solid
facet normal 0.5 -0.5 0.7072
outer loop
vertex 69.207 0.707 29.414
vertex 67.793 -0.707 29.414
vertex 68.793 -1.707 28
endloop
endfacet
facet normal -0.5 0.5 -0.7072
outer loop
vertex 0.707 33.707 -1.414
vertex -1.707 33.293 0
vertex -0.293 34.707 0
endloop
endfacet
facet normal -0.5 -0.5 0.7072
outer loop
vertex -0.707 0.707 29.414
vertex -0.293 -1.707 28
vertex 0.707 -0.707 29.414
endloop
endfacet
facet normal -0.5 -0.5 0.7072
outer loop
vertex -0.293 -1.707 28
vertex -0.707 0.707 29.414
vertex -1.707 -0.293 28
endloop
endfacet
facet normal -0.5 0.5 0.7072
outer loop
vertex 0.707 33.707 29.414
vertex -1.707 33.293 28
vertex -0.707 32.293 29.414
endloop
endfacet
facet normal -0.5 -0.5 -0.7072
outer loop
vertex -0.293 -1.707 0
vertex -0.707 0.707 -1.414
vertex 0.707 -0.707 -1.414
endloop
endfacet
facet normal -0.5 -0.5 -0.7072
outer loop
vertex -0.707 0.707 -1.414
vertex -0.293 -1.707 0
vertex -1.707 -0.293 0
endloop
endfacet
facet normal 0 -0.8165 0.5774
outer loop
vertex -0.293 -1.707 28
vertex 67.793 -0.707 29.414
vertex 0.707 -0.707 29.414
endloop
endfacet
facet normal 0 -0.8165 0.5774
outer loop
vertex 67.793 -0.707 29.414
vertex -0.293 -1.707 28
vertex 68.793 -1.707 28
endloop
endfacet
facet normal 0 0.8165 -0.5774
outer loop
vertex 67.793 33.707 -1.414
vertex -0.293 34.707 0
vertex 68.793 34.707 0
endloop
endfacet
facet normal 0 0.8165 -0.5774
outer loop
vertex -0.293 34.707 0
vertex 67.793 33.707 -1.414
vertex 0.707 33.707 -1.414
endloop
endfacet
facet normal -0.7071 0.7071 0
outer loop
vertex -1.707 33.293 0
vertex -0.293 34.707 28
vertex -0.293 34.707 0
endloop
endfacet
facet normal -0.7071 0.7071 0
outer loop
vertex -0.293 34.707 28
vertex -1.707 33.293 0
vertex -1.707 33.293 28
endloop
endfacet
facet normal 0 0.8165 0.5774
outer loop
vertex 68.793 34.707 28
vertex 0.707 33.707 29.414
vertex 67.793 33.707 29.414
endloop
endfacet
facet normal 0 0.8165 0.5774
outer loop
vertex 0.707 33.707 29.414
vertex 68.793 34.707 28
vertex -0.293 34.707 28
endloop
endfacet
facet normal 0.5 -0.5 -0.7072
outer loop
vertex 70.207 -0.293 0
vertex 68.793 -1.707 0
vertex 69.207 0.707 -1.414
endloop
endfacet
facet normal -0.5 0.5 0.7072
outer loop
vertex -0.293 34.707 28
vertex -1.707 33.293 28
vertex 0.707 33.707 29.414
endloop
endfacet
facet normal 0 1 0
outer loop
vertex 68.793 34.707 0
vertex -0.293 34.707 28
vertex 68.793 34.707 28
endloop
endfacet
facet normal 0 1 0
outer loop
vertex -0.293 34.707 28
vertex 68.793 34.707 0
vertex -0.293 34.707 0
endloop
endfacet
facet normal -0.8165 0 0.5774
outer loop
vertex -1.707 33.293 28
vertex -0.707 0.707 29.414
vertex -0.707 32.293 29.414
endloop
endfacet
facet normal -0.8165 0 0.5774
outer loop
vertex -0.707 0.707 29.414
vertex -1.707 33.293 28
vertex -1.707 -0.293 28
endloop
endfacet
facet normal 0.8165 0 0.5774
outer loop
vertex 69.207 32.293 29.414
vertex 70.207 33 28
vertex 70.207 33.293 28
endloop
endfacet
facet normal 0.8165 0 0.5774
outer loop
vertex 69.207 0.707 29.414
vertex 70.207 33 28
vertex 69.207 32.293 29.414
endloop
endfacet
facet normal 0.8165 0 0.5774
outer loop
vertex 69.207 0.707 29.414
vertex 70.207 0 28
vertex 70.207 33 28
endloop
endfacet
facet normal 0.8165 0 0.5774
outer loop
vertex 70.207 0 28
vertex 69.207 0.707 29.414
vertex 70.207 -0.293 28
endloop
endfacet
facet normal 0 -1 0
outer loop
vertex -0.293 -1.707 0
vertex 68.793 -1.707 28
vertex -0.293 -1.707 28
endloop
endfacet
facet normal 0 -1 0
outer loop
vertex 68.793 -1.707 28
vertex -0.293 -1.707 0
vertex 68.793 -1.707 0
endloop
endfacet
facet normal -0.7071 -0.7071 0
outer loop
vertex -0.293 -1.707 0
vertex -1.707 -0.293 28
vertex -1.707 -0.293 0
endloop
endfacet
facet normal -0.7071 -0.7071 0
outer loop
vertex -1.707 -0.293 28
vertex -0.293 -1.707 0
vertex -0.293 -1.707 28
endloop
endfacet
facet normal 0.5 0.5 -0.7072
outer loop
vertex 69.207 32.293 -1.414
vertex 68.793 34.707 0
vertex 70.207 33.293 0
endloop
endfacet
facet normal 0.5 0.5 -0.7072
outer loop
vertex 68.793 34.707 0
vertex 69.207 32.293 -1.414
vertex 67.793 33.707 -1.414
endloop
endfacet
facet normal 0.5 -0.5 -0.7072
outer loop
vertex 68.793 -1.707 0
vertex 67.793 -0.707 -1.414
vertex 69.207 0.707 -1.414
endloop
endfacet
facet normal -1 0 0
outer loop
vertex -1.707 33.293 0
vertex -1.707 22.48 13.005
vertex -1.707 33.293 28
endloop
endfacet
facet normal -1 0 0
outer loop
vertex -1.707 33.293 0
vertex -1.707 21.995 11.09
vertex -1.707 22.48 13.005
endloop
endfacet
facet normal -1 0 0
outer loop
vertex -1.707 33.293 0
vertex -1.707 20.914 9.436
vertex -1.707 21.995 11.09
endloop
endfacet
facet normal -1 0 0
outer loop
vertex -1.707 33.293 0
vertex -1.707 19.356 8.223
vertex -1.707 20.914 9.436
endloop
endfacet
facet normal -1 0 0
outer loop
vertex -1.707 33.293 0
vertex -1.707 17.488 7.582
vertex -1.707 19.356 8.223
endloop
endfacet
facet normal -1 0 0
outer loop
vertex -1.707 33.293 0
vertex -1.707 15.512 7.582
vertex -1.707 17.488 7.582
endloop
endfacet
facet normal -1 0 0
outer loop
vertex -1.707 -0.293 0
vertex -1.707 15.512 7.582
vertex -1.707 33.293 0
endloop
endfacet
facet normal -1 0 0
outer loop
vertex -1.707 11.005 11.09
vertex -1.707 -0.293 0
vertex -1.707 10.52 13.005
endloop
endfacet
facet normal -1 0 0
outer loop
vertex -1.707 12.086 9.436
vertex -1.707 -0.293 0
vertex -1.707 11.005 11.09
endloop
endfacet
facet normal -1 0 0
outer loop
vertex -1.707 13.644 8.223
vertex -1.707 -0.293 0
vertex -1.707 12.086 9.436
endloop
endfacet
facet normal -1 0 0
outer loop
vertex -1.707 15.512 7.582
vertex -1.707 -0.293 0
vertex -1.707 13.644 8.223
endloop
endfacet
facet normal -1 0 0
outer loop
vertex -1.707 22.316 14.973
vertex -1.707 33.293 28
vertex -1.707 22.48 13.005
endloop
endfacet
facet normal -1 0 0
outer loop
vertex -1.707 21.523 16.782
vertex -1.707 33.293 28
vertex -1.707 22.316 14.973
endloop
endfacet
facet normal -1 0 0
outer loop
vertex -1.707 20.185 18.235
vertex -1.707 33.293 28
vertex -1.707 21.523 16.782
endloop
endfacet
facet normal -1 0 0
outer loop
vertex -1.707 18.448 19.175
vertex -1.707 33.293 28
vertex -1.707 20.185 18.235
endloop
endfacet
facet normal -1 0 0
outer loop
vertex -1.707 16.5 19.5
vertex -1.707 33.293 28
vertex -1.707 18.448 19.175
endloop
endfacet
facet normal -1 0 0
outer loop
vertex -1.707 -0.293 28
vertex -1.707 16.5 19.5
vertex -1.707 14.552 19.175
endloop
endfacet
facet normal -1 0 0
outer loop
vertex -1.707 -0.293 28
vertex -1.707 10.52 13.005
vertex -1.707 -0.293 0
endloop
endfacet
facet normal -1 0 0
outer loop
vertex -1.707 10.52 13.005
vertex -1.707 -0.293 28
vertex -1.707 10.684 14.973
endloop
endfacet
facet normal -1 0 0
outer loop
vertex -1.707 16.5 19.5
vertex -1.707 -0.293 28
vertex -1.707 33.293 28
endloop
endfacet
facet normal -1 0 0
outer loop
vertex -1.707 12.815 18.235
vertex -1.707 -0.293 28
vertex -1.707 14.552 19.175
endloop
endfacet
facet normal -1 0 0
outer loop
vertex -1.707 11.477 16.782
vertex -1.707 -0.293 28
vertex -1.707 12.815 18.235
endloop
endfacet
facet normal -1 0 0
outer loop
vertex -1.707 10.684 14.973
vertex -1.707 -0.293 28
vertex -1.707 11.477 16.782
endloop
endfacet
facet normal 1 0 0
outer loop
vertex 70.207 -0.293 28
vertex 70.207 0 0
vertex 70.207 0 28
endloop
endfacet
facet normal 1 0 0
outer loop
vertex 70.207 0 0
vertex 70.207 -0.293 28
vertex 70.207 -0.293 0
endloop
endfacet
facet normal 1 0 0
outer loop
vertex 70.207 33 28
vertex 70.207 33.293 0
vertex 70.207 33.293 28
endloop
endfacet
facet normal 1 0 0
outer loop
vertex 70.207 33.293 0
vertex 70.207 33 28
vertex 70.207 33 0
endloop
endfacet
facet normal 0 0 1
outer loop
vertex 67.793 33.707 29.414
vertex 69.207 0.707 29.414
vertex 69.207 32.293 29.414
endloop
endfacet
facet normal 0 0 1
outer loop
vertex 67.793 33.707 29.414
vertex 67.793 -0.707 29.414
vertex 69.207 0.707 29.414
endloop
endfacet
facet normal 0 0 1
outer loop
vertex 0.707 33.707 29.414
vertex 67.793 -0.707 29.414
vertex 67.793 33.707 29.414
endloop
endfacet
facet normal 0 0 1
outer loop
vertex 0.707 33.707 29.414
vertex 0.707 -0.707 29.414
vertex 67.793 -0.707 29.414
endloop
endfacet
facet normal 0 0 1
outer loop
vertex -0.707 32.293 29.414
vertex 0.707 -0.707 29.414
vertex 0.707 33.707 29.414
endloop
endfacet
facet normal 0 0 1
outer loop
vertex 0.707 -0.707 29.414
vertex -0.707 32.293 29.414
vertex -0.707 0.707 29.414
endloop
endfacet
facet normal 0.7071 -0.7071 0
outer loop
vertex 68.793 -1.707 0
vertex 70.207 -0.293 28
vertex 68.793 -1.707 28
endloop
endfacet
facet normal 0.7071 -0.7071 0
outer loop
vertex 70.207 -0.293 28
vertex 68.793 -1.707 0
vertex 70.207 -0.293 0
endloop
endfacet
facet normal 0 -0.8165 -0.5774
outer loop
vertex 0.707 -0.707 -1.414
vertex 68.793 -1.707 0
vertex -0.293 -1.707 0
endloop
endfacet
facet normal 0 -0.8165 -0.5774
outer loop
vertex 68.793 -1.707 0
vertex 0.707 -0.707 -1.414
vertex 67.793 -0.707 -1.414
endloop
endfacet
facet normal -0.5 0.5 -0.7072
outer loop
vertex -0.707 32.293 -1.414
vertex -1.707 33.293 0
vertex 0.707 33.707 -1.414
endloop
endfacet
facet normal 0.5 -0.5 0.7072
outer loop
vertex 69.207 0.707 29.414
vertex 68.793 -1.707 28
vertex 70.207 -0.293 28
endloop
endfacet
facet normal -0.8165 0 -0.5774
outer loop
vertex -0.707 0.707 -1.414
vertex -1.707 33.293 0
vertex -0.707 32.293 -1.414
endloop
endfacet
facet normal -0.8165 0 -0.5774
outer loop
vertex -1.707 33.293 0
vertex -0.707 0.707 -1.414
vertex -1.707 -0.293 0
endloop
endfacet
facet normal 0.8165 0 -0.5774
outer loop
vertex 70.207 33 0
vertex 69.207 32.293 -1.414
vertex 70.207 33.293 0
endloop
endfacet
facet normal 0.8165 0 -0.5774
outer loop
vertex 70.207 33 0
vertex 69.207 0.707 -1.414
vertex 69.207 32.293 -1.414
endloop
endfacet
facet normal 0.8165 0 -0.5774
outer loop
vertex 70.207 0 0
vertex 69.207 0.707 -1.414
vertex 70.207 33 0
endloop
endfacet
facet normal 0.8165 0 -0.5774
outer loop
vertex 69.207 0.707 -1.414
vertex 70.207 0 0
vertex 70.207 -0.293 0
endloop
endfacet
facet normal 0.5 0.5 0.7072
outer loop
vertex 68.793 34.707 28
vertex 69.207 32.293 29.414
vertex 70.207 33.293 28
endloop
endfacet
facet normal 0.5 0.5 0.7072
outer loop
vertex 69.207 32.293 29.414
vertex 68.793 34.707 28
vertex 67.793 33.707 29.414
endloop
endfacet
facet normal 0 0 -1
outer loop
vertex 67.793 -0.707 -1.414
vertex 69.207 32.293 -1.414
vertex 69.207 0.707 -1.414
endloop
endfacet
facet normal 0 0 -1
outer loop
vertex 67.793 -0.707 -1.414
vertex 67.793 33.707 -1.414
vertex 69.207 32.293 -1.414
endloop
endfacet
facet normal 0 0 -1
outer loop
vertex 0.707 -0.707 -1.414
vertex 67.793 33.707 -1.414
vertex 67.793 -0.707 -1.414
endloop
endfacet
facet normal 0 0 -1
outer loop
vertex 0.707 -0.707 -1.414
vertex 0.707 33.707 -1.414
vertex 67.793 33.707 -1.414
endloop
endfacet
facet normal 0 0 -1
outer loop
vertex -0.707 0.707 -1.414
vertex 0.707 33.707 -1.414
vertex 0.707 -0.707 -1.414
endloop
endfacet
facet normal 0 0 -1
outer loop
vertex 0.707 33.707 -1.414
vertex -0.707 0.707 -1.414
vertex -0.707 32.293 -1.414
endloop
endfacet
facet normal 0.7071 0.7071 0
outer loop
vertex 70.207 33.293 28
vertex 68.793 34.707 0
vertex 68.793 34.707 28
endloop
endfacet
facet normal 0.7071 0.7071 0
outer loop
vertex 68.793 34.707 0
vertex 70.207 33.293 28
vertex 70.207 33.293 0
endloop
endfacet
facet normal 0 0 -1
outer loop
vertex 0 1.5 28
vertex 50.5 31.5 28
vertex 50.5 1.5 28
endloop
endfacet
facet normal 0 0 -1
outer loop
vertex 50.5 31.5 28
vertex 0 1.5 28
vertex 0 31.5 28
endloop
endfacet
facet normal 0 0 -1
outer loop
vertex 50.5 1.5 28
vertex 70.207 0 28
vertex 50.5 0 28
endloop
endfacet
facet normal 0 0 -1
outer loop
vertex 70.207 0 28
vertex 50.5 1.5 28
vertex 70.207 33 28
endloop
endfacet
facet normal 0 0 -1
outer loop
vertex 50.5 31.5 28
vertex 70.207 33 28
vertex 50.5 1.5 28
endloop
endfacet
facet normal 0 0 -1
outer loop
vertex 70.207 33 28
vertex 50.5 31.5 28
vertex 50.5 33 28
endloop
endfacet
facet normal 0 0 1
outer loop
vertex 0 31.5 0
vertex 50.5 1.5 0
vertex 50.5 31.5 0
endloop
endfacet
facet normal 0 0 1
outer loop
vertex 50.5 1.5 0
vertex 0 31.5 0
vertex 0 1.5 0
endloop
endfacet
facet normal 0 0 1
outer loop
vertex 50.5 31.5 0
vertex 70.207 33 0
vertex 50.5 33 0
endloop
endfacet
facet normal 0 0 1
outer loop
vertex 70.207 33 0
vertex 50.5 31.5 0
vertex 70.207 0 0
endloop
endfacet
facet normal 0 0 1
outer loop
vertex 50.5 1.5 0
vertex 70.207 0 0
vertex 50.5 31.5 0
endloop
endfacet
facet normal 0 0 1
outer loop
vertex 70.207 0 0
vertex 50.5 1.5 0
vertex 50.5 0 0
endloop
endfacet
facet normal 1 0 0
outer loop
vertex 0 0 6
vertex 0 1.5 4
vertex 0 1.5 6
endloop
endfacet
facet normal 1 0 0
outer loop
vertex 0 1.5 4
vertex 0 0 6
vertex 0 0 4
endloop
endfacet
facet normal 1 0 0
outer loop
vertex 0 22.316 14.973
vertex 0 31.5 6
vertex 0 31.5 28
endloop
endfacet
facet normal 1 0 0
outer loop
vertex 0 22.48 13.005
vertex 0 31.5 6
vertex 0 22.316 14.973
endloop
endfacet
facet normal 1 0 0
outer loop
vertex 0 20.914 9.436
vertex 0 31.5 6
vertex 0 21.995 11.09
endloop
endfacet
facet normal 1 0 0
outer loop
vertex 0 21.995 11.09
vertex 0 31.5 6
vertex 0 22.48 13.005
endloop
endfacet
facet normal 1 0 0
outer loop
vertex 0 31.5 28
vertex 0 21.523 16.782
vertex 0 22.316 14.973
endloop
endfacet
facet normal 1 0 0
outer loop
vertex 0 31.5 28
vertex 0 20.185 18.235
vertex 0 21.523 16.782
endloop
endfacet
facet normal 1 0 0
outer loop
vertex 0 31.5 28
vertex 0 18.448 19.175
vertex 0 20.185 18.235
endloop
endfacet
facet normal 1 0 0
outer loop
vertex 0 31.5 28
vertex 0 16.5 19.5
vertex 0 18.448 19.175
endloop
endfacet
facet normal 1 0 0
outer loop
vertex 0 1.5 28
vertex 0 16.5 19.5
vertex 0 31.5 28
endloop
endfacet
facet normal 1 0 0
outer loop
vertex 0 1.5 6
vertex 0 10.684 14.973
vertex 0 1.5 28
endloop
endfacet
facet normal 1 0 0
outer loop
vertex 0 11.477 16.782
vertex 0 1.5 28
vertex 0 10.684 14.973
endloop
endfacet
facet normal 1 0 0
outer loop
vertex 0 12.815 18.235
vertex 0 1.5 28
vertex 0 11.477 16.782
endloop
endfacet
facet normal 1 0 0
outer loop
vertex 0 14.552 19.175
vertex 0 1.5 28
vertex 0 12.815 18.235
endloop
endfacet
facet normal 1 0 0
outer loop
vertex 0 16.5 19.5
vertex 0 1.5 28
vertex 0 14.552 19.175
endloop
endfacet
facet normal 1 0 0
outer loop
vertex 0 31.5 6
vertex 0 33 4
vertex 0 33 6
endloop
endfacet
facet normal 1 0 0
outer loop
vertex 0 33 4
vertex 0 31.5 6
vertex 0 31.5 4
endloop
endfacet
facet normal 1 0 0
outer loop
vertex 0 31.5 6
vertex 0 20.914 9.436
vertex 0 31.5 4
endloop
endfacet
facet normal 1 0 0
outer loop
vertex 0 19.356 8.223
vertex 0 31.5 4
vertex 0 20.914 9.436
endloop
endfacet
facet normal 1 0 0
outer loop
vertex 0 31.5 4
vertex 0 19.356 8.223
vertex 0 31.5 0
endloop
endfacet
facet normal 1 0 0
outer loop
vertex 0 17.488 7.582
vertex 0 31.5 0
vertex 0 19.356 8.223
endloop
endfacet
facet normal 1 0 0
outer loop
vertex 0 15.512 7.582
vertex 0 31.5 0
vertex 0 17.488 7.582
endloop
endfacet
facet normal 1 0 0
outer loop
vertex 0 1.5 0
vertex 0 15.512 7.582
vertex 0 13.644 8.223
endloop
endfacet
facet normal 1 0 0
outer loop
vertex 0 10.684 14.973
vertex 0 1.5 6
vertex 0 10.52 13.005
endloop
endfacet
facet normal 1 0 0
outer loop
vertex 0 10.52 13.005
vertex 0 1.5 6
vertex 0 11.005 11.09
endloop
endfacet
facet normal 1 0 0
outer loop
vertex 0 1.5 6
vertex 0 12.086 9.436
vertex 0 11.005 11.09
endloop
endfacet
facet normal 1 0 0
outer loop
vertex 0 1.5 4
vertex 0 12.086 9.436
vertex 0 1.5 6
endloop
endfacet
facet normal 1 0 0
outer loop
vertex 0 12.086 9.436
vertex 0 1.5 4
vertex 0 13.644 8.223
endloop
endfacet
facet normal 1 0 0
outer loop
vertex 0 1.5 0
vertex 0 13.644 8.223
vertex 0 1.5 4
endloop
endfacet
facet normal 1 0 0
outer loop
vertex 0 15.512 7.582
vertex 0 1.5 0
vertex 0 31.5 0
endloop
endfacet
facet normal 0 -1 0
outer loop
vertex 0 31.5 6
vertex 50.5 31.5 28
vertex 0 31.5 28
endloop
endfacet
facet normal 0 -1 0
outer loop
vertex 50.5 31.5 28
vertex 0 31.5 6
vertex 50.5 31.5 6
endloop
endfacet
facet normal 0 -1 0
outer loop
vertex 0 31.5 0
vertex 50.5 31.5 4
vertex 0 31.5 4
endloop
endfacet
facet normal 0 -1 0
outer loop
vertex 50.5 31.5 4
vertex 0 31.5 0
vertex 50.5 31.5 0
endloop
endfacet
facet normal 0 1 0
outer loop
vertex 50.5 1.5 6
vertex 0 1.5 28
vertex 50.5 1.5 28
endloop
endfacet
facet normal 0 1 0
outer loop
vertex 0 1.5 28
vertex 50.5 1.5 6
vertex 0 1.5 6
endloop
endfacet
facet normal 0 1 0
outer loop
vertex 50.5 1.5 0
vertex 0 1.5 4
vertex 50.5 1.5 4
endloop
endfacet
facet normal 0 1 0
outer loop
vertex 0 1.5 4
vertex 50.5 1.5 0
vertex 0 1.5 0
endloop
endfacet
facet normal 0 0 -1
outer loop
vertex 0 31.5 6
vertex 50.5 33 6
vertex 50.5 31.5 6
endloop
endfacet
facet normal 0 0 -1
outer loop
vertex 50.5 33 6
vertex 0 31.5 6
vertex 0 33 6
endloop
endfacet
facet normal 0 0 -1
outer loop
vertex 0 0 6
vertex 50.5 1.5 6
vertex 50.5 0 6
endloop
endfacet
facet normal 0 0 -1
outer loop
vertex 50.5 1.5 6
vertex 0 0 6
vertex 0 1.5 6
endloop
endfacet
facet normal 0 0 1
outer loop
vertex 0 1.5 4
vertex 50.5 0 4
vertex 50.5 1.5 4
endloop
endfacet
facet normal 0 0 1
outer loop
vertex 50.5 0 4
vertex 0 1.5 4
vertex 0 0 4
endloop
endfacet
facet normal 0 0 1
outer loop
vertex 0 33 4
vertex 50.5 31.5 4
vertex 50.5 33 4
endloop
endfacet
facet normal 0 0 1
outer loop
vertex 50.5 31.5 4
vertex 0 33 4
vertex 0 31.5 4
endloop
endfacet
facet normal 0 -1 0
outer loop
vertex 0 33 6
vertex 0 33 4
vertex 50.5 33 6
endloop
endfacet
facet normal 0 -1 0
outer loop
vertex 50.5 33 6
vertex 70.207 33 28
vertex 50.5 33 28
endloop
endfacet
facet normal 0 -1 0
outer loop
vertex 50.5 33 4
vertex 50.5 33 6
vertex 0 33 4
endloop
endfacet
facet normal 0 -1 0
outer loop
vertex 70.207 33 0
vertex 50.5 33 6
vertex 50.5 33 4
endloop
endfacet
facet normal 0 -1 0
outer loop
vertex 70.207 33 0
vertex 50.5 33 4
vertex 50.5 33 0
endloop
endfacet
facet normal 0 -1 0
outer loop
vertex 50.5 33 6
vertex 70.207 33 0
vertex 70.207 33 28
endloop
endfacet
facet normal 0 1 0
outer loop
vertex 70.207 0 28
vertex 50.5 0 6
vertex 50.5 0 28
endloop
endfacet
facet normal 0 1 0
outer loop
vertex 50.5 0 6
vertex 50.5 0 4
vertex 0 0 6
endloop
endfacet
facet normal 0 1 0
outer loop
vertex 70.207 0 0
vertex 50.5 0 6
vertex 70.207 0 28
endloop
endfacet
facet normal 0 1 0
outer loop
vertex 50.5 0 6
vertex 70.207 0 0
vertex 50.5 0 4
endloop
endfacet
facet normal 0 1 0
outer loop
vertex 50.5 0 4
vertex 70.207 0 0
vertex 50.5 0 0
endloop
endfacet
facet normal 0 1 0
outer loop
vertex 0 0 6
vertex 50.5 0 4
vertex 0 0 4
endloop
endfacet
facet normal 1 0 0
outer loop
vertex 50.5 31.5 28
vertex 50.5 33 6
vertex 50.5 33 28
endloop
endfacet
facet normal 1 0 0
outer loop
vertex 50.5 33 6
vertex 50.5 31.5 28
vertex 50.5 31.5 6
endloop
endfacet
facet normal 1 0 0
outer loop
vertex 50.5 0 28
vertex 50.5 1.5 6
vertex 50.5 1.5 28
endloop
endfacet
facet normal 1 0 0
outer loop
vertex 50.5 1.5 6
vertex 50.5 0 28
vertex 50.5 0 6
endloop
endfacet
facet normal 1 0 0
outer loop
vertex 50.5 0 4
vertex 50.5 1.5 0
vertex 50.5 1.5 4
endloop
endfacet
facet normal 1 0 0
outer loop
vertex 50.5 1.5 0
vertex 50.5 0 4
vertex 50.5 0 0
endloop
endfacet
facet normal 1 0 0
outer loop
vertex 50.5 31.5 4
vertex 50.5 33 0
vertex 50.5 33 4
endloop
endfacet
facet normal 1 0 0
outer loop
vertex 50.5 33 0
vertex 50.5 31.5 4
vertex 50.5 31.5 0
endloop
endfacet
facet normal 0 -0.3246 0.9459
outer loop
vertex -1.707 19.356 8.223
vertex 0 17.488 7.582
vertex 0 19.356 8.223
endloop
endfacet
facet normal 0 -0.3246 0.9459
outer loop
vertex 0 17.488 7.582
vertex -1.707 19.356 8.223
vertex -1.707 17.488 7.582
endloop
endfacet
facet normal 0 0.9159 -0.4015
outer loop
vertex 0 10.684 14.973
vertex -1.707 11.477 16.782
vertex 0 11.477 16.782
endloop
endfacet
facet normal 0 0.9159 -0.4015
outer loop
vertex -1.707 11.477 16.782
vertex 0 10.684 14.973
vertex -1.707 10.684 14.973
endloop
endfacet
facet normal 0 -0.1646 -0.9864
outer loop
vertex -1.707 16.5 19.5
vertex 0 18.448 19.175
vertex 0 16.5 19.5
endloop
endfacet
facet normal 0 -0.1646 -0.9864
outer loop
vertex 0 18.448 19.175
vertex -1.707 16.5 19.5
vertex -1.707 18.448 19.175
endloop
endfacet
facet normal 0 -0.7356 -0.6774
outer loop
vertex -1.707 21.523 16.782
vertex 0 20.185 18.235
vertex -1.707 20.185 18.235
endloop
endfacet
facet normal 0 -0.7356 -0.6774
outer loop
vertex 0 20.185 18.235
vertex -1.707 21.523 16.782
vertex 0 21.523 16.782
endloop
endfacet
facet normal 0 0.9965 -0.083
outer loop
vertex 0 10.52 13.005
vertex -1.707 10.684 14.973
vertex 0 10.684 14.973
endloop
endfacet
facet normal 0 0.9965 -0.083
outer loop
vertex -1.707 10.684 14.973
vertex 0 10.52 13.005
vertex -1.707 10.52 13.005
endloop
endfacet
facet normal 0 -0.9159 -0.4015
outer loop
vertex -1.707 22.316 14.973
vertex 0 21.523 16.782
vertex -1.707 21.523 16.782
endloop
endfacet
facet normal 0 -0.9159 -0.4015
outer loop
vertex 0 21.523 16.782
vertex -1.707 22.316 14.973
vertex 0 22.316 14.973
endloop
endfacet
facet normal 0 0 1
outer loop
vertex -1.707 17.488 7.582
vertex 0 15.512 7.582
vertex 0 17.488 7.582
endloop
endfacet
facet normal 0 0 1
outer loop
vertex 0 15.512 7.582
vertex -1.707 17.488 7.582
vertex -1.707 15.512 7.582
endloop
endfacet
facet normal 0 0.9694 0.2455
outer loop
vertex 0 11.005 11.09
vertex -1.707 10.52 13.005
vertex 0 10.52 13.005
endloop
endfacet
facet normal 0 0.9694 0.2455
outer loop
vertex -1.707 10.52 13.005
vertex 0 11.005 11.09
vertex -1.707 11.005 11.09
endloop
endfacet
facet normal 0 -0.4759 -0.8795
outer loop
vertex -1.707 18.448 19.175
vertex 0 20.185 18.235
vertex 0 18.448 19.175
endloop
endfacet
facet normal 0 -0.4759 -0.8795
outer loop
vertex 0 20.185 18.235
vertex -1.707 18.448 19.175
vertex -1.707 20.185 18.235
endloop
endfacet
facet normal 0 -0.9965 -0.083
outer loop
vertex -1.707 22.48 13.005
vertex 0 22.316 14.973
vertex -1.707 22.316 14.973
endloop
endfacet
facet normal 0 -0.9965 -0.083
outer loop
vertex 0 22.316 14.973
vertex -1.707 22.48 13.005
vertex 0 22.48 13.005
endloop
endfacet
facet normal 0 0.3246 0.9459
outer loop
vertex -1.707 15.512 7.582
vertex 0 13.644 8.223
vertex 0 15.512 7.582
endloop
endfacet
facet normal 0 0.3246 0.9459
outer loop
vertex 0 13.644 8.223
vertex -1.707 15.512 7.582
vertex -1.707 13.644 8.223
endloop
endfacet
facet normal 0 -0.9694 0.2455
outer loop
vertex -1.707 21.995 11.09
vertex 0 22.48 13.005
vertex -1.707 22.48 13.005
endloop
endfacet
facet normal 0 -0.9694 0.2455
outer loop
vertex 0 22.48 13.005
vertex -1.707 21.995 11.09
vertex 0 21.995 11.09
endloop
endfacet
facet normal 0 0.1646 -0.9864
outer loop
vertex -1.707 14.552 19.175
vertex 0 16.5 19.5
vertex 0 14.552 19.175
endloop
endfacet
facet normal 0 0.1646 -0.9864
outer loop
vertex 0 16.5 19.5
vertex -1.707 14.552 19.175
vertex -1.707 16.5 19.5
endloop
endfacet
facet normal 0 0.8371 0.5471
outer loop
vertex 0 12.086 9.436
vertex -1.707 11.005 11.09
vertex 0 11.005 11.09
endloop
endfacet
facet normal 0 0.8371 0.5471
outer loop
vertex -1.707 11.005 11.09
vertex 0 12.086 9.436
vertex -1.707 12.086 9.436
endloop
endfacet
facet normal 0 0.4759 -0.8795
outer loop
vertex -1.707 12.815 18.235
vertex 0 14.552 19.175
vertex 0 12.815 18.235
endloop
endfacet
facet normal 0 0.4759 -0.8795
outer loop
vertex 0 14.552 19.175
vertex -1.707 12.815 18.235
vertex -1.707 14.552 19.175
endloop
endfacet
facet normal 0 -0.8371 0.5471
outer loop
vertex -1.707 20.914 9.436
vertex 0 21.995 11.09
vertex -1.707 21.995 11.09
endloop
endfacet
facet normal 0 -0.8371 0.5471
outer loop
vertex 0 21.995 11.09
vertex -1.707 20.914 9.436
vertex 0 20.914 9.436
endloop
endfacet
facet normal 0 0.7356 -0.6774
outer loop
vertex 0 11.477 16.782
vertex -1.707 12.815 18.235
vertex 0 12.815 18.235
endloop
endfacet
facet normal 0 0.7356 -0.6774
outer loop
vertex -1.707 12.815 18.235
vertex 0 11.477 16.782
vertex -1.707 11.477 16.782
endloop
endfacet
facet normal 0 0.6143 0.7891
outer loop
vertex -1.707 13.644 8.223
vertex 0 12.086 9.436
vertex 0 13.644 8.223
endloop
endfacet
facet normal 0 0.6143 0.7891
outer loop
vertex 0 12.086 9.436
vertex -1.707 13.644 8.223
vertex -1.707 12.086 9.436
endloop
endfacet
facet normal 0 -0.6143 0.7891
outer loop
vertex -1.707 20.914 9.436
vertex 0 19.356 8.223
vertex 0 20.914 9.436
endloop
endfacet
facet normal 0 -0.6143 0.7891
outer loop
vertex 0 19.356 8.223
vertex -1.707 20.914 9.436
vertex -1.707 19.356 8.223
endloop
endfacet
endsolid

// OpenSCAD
//translate([-15, 47.5, pcbO]) import("midiguitarpcb.stl");

w = 68.5;
d = 33;
h = 28;
r = 2;
frontW = 20;
wedgeW = w + r;
wedgeD = 1.5;
wedgeH = 2;
pcbO = 4;

difference() {
	hull() {
		for (x = [0, w]) {
			for (y = [0, d]) {
				for (z = [0, h]) {
					translate([x, y, z]) rotate([0, 45, x > 0 != y > 0 ? -45 : 45]) cube(r, true);
				}
			}
		}
	}
	translate([0, wedgeD, 0]) cube([w + r, d - 2 * wedgeD, h]);
	translate([0, 0, pcbO]) cube([wedgeW, d, wedgeH]);
    translate([w - frontW + r, 0, 0]) cube([frontW, d, h]);
	translate([0, d - 16.5, 7.5 + pcbO + wedgeH]) rotate([0, -90, 0]) cylinder(d = 12, h = r);
}
